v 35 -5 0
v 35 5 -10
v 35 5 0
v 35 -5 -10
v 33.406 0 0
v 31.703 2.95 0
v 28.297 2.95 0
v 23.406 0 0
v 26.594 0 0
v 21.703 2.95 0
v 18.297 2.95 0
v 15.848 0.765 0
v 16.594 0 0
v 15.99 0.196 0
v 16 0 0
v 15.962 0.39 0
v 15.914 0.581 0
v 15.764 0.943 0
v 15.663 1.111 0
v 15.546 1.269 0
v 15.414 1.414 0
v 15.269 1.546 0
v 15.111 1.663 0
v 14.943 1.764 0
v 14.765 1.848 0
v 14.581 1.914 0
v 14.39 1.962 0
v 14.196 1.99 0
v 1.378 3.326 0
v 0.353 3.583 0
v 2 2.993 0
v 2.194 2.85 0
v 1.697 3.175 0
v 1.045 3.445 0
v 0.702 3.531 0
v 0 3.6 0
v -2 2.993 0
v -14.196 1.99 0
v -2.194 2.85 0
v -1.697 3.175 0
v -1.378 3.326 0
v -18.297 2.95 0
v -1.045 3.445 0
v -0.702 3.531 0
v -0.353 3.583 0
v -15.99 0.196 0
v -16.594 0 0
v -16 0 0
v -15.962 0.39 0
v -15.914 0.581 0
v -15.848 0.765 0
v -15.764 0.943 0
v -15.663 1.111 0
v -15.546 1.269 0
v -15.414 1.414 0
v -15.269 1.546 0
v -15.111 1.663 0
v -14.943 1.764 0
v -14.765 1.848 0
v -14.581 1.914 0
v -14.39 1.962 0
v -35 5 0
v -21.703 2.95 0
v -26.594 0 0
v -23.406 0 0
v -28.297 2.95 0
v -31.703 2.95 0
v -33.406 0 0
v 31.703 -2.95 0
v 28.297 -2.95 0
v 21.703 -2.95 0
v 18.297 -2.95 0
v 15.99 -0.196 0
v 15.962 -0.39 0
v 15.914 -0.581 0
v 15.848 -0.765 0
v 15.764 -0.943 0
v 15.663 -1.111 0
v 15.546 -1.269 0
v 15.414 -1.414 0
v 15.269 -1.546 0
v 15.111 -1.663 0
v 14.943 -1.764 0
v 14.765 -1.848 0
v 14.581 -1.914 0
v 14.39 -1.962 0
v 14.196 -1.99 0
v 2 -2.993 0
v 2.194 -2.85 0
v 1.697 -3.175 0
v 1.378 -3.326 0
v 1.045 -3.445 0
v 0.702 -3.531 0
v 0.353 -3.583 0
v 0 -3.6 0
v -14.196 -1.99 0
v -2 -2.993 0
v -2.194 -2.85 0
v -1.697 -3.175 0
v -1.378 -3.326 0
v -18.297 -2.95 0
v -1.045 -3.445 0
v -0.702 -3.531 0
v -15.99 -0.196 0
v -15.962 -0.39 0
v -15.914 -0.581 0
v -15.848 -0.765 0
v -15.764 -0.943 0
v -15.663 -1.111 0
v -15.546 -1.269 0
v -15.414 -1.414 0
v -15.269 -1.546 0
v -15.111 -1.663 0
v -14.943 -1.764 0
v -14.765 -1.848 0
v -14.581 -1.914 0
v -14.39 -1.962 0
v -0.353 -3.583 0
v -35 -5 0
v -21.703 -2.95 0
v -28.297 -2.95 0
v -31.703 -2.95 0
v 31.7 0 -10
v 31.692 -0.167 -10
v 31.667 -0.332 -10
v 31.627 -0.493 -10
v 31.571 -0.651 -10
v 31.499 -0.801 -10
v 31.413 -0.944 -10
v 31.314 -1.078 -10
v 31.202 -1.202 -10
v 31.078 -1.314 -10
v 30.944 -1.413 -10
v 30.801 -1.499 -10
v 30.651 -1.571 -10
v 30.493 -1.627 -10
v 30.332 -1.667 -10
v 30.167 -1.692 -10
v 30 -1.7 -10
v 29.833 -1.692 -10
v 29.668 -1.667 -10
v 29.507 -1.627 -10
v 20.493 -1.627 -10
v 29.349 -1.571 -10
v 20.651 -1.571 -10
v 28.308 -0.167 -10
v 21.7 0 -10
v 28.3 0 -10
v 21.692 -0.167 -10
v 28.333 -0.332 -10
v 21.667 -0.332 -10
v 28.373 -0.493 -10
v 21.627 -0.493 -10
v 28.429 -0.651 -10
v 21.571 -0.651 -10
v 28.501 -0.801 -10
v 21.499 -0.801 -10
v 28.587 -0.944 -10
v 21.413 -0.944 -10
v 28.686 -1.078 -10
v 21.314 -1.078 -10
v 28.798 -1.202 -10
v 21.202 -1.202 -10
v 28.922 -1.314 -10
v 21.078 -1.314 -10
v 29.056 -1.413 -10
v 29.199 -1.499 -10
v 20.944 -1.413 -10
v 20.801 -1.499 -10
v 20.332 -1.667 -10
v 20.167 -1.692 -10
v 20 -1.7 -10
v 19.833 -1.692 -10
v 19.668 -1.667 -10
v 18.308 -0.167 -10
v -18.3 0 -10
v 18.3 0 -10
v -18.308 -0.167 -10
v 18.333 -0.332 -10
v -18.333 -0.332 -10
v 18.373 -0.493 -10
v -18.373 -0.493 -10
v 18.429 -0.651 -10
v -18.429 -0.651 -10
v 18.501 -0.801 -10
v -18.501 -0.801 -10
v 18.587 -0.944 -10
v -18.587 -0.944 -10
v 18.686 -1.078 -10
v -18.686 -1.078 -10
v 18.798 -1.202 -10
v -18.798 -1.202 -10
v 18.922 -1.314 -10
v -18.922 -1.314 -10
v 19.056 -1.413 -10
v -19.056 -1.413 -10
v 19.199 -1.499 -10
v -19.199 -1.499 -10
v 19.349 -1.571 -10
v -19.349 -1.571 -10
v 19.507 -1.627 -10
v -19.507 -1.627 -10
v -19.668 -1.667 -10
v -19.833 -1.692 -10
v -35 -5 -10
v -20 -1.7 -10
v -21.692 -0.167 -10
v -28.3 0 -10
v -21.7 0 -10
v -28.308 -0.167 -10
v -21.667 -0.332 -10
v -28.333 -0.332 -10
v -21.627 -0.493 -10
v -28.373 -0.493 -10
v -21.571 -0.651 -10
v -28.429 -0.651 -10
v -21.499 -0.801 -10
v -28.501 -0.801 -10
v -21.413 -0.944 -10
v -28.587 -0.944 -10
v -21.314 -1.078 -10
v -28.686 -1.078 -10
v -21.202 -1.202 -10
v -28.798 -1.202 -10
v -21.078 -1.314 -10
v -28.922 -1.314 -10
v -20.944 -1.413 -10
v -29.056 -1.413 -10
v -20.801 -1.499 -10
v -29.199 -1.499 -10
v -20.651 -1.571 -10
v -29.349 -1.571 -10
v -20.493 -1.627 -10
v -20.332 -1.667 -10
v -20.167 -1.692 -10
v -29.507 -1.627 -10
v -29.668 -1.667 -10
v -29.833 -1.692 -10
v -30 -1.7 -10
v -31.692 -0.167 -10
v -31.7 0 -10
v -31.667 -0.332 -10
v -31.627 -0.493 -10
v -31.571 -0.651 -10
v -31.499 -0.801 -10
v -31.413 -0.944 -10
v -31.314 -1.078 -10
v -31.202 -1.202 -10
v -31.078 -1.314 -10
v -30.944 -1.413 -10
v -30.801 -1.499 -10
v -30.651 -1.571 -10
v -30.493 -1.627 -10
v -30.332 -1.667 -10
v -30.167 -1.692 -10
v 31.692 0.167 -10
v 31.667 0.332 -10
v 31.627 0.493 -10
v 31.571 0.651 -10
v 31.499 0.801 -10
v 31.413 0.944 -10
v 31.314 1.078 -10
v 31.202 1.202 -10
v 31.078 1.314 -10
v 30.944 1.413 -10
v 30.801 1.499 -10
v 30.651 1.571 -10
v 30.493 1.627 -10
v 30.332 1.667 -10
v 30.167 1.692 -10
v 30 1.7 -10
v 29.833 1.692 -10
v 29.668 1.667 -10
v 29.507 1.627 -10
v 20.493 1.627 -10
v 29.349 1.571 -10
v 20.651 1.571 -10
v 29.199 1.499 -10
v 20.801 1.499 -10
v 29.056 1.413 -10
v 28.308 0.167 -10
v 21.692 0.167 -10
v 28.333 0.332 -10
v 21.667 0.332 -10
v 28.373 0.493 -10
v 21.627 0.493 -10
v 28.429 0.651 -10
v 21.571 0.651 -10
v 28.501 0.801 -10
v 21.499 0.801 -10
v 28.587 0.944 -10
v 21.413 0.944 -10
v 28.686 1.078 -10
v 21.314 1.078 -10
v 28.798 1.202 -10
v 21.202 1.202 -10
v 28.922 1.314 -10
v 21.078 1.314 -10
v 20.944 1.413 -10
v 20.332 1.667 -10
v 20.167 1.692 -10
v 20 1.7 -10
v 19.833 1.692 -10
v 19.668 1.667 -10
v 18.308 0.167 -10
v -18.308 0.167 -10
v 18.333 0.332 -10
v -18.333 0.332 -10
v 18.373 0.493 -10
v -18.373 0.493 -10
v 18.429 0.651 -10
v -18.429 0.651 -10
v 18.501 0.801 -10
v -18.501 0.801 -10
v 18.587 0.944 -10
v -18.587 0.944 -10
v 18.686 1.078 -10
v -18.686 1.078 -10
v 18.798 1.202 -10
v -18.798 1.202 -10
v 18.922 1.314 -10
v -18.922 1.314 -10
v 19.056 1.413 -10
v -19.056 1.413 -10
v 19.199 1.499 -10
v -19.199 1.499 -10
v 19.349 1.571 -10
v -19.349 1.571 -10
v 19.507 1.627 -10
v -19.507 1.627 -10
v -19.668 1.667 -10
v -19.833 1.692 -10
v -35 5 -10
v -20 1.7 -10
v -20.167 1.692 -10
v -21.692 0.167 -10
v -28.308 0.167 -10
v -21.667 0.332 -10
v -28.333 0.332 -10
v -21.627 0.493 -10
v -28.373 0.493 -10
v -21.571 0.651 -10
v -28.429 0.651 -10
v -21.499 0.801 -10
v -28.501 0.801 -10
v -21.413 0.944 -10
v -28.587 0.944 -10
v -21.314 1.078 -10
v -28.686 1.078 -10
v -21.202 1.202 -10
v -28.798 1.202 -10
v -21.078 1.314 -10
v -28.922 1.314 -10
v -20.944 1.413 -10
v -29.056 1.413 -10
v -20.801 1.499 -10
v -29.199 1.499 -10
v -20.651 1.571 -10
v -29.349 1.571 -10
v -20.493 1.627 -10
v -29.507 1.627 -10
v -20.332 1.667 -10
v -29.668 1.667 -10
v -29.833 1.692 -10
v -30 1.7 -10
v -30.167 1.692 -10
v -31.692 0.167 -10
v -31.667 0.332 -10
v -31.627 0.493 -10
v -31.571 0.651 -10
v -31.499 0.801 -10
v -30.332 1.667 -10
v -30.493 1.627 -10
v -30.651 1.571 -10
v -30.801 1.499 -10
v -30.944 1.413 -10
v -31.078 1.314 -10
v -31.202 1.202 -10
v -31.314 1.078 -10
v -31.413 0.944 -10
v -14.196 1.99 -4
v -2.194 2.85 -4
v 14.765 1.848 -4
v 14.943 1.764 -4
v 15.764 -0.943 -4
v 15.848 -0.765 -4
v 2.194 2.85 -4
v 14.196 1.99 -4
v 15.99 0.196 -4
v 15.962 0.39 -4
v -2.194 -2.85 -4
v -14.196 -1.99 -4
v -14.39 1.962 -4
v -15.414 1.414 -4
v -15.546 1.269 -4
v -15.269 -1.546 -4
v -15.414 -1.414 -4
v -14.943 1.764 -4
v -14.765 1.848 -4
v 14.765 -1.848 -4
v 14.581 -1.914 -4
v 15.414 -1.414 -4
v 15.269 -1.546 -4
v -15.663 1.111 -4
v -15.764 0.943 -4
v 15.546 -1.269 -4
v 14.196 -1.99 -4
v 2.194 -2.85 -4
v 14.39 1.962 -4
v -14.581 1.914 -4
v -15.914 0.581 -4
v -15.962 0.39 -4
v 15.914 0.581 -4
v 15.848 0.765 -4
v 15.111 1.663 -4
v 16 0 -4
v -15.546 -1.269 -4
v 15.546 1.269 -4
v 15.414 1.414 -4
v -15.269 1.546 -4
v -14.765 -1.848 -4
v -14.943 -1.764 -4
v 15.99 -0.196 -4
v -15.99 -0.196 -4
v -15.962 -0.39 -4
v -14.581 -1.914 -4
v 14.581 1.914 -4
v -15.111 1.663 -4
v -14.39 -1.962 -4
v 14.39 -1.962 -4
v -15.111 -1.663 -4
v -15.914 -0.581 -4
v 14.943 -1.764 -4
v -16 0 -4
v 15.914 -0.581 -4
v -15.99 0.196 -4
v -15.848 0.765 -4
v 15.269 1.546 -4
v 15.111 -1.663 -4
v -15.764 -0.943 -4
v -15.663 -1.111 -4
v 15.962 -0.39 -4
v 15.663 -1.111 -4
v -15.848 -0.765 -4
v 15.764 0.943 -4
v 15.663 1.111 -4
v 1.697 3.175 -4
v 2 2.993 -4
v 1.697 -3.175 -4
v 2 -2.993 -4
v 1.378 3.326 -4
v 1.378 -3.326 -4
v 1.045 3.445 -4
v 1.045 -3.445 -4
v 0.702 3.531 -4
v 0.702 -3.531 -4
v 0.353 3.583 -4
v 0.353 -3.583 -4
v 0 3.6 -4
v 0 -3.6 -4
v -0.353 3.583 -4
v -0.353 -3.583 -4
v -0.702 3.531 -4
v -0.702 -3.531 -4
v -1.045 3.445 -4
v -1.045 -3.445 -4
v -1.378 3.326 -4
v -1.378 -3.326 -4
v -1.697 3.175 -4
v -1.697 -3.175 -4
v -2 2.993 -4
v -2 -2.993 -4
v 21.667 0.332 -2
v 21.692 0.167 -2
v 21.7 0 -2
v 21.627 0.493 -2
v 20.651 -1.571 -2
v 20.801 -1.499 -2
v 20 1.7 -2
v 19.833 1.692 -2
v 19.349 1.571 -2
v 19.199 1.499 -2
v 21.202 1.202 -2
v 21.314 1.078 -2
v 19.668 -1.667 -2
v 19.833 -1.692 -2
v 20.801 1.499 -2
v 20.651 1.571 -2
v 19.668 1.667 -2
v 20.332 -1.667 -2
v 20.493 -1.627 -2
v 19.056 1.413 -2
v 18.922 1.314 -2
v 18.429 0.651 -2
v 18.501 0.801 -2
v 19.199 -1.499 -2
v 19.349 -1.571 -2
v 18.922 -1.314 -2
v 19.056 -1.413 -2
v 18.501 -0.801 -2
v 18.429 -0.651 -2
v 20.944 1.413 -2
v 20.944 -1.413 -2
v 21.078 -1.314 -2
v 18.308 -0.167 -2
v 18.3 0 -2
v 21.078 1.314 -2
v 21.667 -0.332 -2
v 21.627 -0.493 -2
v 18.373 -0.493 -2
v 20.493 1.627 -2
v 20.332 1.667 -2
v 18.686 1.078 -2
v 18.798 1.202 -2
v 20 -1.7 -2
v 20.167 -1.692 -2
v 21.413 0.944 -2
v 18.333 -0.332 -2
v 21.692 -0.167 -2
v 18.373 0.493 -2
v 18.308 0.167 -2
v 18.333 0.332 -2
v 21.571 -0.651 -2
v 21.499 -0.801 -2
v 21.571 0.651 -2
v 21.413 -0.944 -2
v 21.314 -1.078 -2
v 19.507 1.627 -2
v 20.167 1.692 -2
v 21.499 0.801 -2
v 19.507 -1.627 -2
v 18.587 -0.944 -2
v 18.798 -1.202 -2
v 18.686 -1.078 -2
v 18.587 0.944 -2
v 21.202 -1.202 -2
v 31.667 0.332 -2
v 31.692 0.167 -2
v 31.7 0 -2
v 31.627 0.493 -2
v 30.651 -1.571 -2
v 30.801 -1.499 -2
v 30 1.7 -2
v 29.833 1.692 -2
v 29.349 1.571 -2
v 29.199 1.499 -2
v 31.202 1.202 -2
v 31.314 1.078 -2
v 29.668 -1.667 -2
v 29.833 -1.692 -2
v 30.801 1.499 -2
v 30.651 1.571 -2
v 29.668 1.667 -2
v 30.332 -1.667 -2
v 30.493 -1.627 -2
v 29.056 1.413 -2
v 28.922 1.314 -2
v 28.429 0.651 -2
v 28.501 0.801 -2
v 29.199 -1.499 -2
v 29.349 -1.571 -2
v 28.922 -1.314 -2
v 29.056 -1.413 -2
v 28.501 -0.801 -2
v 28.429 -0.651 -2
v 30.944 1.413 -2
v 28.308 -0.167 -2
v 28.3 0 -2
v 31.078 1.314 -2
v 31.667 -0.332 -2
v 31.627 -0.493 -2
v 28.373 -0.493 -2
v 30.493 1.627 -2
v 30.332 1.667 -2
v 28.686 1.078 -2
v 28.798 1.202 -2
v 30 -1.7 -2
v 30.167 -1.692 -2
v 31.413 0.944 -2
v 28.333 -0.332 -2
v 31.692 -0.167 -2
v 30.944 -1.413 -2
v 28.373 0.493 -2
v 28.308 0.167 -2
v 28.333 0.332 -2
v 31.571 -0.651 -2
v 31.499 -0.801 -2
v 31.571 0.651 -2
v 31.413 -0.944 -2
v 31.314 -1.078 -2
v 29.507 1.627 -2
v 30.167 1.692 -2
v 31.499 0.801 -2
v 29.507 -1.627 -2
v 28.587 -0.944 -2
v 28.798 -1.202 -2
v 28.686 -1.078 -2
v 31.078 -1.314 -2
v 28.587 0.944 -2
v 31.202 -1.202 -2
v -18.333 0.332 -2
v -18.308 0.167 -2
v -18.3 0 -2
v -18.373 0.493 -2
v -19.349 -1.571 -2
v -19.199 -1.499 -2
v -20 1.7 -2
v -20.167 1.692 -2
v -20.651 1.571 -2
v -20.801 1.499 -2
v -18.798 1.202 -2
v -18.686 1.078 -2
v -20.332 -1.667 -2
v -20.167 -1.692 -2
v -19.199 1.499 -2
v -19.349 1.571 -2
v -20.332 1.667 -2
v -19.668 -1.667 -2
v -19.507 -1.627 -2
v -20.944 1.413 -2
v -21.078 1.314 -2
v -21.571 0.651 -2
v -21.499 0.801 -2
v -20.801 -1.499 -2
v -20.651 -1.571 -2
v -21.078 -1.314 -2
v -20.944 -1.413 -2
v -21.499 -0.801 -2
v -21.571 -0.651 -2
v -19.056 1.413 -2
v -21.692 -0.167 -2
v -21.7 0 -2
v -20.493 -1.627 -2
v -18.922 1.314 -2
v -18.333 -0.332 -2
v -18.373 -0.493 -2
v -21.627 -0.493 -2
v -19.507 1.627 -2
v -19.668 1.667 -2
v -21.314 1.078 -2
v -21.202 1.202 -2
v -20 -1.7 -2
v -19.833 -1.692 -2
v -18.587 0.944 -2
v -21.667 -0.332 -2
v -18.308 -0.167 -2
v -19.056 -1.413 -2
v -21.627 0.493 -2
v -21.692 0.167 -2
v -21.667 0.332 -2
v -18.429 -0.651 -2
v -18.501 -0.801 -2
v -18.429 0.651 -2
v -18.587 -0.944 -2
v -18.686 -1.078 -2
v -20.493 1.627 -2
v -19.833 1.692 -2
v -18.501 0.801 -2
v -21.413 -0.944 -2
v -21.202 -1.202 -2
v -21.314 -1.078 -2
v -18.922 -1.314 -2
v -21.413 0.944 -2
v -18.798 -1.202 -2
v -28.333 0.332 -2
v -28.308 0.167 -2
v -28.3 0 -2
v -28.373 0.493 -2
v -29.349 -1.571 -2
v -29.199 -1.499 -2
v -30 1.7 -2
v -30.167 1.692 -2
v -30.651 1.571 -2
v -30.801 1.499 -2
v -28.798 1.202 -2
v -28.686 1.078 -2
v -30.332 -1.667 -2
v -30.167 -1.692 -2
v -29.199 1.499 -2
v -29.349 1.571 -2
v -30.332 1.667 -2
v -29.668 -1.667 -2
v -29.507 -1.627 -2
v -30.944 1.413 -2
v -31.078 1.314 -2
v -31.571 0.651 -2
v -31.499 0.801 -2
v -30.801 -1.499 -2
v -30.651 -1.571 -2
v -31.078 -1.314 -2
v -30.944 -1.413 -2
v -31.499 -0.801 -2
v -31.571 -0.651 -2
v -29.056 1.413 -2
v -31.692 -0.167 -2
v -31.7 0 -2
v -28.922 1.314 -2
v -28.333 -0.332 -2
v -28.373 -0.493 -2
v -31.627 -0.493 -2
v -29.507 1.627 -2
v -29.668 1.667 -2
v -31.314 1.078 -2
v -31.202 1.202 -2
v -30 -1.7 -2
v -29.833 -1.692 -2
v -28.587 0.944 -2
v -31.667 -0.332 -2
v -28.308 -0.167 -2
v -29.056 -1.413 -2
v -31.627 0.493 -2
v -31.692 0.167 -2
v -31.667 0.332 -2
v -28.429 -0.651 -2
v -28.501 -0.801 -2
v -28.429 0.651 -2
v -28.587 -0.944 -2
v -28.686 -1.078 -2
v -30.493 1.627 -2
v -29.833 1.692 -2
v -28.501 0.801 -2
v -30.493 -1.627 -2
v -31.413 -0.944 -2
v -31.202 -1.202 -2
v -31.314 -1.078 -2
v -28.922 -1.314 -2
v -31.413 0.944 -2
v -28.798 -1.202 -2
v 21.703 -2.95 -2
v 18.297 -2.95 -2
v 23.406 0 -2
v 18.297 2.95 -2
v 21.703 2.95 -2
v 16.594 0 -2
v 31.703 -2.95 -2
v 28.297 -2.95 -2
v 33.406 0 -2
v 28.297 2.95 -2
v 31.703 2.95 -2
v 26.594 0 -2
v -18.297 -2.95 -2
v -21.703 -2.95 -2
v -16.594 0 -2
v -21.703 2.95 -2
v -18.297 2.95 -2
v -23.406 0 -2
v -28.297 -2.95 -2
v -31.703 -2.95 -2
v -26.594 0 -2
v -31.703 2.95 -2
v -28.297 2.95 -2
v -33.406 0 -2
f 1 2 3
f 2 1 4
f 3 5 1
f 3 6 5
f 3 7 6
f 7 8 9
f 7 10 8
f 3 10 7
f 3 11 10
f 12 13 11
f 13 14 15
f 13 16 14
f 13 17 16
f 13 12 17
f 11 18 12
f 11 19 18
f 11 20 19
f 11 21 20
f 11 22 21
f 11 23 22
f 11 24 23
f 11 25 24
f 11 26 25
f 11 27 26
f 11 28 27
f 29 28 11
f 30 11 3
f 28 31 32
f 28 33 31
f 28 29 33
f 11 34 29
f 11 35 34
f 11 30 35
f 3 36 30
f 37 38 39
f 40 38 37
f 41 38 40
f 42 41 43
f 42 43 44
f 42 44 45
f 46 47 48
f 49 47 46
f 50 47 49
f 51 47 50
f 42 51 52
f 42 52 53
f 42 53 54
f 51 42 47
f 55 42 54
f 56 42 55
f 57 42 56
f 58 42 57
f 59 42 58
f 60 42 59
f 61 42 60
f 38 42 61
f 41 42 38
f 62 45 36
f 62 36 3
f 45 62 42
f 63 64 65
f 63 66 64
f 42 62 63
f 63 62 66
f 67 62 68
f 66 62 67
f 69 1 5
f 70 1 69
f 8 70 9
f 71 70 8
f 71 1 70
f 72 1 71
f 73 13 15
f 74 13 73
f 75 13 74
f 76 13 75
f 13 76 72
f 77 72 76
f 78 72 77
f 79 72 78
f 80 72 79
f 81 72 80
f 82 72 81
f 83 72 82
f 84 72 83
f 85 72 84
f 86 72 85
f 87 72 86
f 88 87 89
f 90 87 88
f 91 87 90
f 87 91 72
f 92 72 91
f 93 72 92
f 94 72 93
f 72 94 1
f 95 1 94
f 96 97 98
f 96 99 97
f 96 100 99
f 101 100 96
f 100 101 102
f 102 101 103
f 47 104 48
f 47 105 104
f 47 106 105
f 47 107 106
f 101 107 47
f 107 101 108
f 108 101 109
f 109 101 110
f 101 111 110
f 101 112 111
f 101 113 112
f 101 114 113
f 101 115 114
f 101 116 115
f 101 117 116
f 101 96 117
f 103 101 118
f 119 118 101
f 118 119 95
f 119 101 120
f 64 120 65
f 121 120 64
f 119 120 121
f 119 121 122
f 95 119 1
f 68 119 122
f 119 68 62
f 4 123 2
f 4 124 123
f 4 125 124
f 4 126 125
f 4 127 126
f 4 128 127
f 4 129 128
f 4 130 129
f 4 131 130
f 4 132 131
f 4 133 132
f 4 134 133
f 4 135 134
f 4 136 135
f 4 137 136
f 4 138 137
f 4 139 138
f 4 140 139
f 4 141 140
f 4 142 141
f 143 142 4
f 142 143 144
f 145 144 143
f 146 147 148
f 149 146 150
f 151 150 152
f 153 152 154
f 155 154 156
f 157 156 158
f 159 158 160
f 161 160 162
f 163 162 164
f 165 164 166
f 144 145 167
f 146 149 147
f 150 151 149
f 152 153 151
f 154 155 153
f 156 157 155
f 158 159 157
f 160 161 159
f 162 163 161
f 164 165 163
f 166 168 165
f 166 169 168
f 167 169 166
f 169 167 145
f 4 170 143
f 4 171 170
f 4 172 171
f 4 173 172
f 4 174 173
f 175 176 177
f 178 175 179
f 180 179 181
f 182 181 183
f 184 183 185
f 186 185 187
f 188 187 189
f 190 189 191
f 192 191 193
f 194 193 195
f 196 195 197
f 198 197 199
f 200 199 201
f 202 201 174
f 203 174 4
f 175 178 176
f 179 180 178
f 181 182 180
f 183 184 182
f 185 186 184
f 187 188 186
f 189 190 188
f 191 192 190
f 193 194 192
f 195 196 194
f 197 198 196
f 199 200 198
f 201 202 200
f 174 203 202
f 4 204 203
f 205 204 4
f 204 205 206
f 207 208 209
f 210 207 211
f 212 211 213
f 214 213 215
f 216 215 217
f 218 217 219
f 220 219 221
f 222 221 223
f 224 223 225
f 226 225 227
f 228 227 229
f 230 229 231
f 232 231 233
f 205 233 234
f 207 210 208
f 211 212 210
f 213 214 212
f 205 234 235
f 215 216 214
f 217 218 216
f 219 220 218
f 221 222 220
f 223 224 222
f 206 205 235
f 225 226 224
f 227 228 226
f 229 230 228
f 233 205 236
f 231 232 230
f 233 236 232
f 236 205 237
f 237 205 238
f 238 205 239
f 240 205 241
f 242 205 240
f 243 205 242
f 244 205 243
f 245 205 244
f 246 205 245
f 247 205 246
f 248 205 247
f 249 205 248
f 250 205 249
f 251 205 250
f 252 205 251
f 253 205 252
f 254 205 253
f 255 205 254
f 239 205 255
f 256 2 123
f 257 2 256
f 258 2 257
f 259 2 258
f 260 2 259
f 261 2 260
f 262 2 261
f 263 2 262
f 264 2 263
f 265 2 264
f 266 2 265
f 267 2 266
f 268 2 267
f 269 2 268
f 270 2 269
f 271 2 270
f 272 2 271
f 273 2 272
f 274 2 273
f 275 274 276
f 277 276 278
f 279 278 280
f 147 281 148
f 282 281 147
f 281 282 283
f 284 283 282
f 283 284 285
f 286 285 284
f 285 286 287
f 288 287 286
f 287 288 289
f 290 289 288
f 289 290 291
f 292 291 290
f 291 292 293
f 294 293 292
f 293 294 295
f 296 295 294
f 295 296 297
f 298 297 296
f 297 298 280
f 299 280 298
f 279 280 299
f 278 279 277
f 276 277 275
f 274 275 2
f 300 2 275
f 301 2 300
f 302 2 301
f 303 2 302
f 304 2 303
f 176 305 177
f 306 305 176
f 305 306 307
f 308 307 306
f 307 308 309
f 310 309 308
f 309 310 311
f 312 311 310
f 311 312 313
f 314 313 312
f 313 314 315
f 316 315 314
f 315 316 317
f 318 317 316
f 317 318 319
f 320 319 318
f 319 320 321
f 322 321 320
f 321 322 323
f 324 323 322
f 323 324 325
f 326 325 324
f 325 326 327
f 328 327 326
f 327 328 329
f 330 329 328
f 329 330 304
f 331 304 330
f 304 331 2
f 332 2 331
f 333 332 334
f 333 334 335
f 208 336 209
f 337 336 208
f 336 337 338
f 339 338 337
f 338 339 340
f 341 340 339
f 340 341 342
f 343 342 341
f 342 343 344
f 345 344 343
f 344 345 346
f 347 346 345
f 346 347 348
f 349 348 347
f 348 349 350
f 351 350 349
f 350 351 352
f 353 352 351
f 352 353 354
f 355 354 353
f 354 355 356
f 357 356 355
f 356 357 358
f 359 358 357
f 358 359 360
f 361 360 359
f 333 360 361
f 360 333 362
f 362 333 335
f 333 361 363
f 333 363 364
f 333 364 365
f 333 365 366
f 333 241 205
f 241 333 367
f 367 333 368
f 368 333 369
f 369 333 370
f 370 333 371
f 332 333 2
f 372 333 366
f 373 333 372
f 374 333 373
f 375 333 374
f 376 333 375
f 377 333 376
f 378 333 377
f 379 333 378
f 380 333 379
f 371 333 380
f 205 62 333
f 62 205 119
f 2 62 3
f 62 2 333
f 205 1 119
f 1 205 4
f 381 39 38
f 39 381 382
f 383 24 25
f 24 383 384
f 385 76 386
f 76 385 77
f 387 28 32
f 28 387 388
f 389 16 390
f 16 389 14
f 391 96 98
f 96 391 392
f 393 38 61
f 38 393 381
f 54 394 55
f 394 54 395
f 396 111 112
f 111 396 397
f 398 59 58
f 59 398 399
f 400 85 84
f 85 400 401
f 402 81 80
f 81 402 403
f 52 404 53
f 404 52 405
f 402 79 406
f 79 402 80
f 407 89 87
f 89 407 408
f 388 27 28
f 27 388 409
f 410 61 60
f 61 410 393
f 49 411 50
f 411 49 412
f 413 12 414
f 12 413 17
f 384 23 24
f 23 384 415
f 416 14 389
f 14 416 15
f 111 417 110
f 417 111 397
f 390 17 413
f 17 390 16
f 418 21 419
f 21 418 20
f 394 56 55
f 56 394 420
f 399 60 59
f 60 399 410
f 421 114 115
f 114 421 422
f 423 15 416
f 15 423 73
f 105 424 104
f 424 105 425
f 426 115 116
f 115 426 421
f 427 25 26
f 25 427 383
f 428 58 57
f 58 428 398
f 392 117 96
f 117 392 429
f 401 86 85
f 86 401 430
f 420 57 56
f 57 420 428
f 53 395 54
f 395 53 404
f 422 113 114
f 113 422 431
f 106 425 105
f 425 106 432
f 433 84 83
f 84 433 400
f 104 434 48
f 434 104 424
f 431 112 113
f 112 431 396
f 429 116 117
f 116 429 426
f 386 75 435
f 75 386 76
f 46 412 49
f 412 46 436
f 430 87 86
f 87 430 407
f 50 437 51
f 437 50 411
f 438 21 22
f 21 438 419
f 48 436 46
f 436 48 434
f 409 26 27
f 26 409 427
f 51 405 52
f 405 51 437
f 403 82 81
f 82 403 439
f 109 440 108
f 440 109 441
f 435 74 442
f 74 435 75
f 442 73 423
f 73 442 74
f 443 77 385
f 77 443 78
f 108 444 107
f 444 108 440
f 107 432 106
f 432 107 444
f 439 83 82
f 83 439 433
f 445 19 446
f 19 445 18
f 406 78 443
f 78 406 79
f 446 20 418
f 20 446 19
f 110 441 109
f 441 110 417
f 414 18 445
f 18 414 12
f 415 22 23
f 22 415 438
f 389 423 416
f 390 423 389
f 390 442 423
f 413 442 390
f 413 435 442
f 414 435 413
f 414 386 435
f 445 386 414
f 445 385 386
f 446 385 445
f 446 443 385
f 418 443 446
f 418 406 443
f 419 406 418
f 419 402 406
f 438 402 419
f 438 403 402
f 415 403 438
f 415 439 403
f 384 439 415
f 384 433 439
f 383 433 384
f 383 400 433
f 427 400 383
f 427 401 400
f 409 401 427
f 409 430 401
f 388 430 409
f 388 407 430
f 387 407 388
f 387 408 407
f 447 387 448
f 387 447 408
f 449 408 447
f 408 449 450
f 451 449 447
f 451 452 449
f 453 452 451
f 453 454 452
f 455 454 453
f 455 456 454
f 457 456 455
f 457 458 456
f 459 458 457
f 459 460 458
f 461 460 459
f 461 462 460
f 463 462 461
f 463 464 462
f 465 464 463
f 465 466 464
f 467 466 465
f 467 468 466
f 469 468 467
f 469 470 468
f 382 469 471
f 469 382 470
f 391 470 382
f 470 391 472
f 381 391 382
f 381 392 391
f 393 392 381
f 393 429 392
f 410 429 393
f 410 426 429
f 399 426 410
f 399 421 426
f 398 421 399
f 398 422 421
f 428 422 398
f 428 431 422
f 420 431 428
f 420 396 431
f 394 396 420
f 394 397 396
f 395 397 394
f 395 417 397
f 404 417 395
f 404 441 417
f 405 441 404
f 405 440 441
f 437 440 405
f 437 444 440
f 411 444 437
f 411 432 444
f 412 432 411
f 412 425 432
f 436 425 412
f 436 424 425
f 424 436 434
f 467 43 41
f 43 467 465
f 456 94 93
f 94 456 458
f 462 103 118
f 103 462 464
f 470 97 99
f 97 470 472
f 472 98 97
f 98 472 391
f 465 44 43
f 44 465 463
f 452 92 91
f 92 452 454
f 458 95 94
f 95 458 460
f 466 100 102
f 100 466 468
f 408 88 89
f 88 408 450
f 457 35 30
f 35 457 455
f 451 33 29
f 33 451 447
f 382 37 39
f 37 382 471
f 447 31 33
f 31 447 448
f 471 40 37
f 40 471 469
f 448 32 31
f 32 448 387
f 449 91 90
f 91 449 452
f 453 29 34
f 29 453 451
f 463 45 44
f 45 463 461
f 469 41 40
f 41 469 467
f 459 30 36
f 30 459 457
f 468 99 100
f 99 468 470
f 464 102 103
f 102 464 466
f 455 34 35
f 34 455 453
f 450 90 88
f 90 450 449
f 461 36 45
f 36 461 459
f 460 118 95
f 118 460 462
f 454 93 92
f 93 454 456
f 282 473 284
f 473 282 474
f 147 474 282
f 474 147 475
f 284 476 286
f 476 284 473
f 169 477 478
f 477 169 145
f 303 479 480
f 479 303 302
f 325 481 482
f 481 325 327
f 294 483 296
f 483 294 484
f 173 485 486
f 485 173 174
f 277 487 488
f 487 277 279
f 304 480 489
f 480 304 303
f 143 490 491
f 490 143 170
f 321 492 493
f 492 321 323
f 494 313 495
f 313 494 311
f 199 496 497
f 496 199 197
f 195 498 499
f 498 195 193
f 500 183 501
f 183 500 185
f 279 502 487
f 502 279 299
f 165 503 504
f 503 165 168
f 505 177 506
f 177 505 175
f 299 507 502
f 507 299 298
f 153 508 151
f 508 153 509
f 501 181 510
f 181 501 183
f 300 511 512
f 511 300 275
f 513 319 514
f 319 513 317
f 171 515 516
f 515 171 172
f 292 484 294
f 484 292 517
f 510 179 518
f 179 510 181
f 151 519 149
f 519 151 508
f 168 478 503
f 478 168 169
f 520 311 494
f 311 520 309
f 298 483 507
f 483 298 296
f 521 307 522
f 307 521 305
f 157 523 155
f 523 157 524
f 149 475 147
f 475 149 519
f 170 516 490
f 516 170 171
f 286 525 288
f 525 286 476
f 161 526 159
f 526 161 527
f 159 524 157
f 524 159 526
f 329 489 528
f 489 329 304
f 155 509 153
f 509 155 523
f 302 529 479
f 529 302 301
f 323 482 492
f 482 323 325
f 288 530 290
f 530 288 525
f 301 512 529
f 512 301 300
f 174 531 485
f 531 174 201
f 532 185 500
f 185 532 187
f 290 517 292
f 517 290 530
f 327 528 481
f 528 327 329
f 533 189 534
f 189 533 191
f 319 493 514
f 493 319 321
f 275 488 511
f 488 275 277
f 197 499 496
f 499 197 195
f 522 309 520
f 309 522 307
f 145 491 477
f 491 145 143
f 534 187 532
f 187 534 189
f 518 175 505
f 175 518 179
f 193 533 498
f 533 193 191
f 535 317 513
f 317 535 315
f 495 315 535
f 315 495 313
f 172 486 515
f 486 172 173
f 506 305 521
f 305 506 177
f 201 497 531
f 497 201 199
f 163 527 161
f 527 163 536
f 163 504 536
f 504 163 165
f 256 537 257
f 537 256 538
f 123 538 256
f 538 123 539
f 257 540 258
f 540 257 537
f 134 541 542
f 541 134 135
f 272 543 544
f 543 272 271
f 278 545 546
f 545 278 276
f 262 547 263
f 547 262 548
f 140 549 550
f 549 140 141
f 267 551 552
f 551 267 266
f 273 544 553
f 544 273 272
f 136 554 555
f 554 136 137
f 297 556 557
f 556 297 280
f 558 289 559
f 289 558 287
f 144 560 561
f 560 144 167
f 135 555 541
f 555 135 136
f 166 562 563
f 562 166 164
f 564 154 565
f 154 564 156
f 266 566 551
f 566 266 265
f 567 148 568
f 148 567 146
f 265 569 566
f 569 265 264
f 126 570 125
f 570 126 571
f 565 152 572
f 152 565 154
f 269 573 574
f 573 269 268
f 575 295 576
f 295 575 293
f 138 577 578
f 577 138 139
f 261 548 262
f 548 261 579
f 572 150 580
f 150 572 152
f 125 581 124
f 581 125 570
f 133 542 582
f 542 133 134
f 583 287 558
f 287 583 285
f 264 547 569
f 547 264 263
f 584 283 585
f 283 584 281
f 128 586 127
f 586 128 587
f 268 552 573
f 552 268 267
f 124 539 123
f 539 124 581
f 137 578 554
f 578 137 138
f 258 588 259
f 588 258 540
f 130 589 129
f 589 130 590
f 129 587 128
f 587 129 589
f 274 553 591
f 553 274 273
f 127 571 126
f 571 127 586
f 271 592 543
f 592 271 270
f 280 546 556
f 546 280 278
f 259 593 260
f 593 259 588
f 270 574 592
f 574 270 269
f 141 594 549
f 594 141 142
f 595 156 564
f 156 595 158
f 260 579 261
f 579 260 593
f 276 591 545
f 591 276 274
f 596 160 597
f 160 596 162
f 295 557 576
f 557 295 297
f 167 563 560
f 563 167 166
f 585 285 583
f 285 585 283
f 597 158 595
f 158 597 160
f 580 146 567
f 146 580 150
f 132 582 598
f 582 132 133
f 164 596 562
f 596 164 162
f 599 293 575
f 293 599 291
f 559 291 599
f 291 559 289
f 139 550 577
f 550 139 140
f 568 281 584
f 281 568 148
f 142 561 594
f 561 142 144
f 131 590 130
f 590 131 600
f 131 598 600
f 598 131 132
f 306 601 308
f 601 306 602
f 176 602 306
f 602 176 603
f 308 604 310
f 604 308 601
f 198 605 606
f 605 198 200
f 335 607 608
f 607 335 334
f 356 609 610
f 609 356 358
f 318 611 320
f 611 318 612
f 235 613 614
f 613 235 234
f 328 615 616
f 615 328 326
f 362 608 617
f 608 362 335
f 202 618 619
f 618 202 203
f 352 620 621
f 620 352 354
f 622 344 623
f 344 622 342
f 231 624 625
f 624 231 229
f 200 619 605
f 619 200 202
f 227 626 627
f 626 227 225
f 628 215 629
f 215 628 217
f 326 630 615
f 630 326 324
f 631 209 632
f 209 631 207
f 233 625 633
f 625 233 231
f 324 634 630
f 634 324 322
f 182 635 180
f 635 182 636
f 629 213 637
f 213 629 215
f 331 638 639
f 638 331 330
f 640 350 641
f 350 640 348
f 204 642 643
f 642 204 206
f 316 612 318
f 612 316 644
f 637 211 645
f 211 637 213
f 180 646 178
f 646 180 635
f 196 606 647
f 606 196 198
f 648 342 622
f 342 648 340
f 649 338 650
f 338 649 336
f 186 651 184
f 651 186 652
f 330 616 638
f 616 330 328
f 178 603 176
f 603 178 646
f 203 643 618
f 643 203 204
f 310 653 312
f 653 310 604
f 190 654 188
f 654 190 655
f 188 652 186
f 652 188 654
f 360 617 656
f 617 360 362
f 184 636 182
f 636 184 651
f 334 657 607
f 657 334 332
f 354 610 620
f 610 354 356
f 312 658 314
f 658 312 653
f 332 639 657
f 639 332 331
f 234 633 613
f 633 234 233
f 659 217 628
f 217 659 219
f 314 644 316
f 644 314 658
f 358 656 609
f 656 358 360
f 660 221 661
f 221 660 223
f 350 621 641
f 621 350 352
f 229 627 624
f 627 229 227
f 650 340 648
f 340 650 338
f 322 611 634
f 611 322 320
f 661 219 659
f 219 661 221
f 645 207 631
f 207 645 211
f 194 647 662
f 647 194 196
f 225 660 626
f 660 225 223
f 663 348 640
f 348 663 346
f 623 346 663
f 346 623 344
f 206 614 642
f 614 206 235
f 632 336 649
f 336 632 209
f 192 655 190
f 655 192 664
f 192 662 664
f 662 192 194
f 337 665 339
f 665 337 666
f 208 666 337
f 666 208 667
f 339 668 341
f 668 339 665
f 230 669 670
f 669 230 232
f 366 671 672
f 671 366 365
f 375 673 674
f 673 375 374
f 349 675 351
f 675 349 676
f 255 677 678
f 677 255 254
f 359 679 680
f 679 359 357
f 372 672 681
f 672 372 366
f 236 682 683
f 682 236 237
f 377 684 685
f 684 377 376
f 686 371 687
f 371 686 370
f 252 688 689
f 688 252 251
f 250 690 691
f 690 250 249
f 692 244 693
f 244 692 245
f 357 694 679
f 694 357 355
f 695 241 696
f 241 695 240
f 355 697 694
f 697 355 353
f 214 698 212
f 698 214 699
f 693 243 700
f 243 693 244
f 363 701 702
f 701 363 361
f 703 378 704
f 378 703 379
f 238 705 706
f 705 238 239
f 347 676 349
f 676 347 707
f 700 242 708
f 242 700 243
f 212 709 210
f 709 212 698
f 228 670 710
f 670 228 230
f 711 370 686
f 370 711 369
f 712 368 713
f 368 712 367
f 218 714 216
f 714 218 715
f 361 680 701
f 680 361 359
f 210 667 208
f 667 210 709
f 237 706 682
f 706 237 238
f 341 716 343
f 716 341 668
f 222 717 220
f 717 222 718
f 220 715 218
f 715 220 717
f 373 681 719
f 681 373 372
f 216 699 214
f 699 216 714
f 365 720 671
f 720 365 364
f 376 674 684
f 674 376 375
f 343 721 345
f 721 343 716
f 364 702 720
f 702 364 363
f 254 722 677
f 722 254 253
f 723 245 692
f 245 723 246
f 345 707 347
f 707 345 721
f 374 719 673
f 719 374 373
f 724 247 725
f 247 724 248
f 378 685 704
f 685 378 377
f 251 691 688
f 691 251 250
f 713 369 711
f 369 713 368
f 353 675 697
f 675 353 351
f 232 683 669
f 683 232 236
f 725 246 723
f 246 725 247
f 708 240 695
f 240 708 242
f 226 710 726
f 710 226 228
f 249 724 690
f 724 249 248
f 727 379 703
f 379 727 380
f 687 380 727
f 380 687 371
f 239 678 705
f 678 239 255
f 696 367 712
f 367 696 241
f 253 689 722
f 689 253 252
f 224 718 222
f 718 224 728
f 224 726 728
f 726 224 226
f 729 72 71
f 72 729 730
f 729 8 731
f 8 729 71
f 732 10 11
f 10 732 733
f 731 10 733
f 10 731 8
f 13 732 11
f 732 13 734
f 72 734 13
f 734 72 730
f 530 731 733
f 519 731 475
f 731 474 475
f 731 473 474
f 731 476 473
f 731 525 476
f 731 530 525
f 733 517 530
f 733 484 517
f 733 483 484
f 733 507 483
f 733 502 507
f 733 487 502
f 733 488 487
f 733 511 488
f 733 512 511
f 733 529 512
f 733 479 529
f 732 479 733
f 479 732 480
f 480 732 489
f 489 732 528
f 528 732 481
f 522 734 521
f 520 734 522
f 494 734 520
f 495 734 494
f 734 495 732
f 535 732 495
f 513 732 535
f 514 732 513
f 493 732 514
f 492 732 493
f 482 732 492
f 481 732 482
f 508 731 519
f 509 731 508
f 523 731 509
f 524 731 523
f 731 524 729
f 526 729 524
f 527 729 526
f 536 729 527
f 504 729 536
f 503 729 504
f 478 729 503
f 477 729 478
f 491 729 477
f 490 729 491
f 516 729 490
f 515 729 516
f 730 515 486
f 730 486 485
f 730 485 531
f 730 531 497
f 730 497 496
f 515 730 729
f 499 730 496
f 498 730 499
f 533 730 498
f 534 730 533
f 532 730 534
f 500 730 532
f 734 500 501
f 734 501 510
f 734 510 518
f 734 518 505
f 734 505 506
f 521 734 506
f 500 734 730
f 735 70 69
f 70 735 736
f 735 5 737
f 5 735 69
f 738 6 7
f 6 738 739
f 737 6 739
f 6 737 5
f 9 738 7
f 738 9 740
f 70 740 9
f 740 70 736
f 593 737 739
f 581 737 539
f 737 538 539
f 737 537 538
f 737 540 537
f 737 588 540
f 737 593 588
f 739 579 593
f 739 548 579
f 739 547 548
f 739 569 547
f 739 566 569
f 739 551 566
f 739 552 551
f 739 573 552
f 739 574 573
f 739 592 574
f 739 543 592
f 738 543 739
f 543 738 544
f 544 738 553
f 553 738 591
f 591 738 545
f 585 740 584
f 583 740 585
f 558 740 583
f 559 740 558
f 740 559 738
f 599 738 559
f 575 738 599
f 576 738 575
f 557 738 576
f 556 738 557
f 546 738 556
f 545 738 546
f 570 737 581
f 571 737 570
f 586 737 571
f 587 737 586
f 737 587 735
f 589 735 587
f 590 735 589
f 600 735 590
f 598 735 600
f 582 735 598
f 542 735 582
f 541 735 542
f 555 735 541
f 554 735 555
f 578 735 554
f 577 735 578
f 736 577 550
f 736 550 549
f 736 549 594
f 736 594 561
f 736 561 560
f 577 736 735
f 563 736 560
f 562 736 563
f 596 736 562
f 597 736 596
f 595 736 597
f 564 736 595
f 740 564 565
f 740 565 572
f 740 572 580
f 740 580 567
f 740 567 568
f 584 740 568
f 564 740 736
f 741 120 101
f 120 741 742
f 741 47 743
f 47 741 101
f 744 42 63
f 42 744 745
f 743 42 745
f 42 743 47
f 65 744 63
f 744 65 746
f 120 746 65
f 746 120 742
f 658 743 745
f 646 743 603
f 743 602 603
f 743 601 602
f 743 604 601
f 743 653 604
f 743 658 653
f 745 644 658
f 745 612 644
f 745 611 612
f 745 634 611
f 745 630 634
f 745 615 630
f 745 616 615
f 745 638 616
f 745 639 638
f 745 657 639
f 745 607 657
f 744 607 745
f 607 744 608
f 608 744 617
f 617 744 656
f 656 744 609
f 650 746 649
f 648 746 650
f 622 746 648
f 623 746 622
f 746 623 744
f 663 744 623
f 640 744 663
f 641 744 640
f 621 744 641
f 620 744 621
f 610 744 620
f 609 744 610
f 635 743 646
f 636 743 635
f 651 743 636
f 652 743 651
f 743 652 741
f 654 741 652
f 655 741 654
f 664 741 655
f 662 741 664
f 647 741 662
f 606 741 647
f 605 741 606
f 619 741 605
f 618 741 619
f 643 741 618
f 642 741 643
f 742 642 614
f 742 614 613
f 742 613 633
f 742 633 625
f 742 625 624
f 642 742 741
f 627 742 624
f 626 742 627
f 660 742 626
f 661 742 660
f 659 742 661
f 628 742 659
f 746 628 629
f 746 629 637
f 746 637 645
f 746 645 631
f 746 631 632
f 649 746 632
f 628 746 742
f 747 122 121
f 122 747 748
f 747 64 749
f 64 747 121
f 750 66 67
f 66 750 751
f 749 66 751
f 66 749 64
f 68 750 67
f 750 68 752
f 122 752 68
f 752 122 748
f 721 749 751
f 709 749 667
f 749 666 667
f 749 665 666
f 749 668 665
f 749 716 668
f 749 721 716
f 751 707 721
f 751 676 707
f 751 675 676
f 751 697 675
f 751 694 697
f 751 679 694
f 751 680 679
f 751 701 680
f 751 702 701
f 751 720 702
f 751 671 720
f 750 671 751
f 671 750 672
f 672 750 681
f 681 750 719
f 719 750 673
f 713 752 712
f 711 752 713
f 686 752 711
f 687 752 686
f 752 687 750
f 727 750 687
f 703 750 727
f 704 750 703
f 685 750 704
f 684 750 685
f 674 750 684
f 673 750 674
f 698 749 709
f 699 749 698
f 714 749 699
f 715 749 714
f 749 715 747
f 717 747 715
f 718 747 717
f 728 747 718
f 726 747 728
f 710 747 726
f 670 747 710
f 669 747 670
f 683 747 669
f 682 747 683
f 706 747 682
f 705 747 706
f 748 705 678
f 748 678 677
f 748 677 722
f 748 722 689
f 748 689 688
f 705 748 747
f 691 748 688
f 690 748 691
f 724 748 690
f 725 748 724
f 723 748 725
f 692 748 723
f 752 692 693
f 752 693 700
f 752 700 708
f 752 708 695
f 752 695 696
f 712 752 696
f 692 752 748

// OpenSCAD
screw_length = 30;
screw_small_size = 3.4;
screw_m3_length = 4;
screw_m3_size = 2*(5.5+0.4) / sqrt(3);

difference(){
    
translate([0,0,-5])
    cube([70,10,10], center=true);
    
hull(){

translate([0,0,-1.5])
cylinder(d=6,h=5,center=true, $fn=64);
    translate([14,0,-1.5])
    cylinder(d=4,h=5,center=true, $fn=64);
    translate([-14,0,-1.5])
    cylinder(d=4,h=5,center=true, $fn=64);
}

translate([0,0,-1.5])
cylinder(d=7.2,h=5,center=true, $fn=64);

//Small Holes
translate([20,0,0])
cylinder(d=screw_small_size,h=screw_length,center=true, $fn=64);
translate([30,0,0])
cylinder(d=screw_small_size,h=screw_length,center=true, $fn=64);
translate([-20,0,0])
cylinder(d=screw_small_size,h=screw_length,center=true, $fn=64);
translate([-30,0,0])
cylinder(d=screw_small_size,h=screw_length,center=true, $fn=64);

//Nut holes
translate([20,0,0])
cylinder(d=screw_m3_size,h=screw_m3_length,center=true, $fn=6);
translate([30,0,0])
cylinder(d=screw_m3_size,h=screw_m3_length,center=true, $fn=6);
translate([-20,0,0])
cylinder(d=screw_m3_size,h=screw_m3_length,center=true, $fn=6);
translate([-30,0,0])
cylinder(d=screw_m3_size,h=screw_m3_length,center=true, $fn=6);


//Fire små huller
translate([12,0,0])
cylinder(d=1.5, h=8, center = true, $fn=64);
translate([-12,0,0])
cylinder(d=1.5, h=8, center = true, $fn=64);
translate([8.5,0,0])
cylinder(d=1.5, h=8, center = true, $fn=64);
translate([-8.5,0,0])
cylinder(d=1.5, h=8, center = true, $fn=64);

}
